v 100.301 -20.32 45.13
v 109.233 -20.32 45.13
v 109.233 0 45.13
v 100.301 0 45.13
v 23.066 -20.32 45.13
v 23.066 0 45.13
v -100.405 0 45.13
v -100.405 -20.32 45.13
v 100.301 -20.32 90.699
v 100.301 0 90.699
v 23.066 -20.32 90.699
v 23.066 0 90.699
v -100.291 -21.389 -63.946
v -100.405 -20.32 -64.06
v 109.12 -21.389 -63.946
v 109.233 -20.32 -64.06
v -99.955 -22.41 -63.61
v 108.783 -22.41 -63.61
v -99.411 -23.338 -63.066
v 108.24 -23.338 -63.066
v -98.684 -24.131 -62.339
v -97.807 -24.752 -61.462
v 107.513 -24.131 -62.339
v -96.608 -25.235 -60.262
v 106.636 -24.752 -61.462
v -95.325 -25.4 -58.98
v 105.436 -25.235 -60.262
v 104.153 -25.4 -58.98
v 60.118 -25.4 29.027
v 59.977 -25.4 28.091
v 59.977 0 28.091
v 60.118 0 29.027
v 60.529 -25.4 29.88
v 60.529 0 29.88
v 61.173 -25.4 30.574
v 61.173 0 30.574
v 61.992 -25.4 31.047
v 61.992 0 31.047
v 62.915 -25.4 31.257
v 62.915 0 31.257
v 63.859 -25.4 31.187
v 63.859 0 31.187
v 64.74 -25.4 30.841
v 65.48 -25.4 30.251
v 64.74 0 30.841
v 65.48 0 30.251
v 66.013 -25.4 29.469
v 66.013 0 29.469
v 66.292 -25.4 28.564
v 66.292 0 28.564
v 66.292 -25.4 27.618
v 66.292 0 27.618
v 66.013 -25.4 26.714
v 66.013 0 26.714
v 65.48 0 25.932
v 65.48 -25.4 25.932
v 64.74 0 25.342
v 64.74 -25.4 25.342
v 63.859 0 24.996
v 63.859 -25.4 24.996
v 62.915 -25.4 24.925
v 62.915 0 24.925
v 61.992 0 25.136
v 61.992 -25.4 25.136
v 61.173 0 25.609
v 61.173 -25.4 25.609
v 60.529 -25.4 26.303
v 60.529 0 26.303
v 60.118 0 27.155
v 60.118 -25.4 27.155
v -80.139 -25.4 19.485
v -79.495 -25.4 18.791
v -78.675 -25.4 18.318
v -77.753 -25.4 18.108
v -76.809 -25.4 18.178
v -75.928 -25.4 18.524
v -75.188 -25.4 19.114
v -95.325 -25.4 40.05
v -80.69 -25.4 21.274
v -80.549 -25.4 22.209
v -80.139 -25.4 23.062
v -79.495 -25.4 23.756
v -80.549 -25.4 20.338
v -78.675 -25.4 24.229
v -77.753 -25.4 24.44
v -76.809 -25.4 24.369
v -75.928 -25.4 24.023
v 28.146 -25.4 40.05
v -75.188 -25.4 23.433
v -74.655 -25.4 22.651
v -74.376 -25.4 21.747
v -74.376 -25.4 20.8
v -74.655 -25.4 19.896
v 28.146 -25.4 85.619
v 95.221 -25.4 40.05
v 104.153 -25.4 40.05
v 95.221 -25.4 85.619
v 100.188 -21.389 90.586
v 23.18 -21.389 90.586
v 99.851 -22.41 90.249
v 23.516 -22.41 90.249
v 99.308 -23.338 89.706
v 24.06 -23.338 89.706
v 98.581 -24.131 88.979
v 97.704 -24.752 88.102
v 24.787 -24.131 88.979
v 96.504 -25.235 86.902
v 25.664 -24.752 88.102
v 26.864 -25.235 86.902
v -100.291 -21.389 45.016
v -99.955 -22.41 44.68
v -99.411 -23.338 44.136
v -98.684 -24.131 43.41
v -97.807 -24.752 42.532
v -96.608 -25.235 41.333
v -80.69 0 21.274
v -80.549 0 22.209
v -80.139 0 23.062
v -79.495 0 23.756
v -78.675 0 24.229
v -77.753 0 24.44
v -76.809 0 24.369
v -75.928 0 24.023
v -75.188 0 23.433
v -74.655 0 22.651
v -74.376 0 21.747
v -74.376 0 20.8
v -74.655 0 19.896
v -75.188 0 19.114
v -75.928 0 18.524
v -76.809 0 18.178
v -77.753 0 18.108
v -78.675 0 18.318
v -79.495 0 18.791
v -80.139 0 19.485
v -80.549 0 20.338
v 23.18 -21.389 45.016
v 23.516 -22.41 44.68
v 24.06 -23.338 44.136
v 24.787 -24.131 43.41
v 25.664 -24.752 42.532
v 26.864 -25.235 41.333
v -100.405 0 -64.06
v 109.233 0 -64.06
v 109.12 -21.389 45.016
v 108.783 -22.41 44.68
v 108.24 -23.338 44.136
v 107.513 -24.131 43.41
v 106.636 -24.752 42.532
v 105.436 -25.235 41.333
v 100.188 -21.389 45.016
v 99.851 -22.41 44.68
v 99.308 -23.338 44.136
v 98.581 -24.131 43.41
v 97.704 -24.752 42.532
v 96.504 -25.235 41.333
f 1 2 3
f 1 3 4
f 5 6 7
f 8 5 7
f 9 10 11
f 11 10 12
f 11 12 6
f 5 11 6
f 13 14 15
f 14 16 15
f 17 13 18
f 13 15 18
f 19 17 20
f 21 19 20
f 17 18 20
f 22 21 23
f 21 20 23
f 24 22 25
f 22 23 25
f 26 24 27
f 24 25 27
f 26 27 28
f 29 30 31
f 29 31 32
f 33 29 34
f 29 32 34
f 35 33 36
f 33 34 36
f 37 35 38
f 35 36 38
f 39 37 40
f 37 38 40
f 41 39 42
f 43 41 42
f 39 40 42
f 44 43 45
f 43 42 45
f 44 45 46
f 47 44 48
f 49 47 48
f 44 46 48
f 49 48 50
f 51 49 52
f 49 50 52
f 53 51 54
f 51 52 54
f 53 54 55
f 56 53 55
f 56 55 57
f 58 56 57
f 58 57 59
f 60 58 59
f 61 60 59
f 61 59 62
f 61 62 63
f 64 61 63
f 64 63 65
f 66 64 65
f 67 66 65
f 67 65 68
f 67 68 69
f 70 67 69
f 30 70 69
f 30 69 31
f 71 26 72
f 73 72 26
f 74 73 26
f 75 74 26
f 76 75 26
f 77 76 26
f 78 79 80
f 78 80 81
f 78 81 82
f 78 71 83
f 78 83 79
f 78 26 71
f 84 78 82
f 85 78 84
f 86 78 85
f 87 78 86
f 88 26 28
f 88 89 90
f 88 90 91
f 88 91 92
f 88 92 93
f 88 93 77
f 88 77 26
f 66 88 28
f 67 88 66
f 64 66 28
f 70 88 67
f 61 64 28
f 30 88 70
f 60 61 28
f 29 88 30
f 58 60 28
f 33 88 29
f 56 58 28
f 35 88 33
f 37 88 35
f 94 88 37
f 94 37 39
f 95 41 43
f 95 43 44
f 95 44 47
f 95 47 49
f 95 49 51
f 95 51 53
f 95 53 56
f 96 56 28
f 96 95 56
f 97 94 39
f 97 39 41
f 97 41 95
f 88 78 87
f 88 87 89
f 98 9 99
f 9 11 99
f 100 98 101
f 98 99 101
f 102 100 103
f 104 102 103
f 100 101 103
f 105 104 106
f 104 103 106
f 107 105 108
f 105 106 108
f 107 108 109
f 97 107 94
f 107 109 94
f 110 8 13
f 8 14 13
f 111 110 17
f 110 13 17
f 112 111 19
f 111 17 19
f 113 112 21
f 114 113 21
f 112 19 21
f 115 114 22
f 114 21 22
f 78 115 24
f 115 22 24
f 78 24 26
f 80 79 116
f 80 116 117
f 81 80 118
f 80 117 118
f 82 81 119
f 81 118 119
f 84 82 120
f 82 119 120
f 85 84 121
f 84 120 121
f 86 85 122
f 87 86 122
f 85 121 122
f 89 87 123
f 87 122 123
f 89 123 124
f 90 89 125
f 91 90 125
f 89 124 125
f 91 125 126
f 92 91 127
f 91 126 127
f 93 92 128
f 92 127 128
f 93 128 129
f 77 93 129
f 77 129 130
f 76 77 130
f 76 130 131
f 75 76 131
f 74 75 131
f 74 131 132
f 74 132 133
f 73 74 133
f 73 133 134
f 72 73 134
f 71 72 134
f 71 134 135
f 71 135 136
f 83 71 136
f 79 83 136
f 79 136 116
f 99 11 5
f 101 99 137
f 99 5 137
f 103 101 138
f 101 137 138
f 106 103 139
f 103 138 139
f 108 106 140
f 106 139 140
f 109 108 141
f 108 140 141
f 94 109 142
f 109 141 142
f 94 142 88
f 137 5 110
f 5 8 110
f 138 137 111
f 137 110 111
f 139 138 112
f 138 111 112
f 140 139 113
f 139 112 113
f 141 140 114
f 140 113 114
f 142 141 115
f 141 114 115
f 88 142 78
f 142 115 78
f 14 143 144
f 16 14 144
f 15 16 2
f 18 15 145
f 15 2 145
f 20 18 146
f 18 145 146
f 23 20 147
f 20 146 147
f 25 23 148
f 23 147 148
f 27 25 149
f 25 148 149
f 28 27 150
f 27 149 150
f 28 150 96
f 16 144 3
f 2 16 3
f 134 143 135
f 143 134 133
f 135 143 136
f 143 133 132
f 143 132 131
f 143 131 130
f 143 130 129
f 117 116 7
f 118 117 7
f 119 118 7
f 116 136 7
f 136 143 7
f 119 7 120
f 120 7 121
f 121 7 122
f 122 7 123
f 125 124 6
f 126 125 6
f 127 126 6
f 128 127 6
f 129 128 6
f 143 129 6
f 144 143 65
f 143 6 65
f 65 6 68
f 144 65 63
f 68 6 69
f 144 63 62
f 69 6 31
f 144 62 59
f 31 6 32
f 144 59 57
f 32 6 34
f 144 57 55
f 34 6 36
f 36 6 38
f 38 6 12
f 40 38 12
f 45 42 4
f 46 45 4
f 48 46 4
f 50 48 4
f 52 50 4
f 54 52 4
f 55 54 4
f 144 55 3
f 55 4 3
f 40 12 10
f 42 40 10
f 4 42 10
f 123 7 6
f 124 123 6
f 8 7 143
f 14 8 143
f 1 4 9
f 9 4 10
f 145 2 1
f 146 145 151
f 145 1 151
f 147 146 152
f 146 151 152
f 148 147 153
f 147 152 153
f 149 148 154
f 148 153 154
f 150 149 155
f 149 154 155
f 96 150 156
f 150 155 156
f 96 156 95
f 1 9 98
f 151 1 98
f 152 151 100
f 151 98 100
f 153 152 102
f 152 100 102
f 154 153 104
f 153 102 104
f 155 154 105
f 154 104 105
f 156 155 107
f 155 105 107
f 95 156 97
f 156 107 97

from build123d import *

# Parameters (mm, degrees)
F0_W     = 19.7901576757
F0_H     = 22.3555974662
F1_DEPTH = 25.4
F0_W_2   = 77.2351417691
F0_H_2   = 37.3888155445
F0_W_3   = 14.1860321164
F0_H_3   = 13.0779221654
F2_R     = 5.08
F4_R     = 14.5126216771
F5_DEPTH = 4.064
F7_D     = 6.35


with BuildPart() as f1:
    # F0 (on Front) → F1 (new body)
    with BuildSketch(Plane.XZ):
        Polygon((-143.1801915169, 45.9882542491), (-120.1951056719, 45.9882542491), (-120.1951056719, 68.3438517153), (-120.1951056719, 90.6994491816), (-143.1801915169, 90.6994491816), align=None)
        with Locations((-110.300026834, 79.5216504484)):
            Rectangle(F0_W, F0_H)
    extrude(amount=F1_DEPTH)


with BuildPart() as f1b:
    # F0 (on Front) → F1, piece 2 (new body)
    with BuildSketch(Plane.XZ):
        Polygon((23.0662133545, 45.1301448047), (-100.4049479961, 45.1301448047), (-100.4049479961, -64.0596598387), (109.2333272099, -64.0596598387), (109.2333272099, 45.1301448047), (100.3013551235, 45.1301448047), (100.3013551235, 7.7413292602), (23.0662133545, 7.7413292602), align=None)
        Polygon((23.0662133545, 90.6994491816), (23.0662133545, 45.1301448047), (100.3013551235, 45.1301448047), (100.3013551235, 90.6994491816), (88.216945529, 90.6994491816), (88.216945529, 77.6215270162), (74.0309134126, 77.6215270162), (74.0309134126, 90.6994491816), align=None)
        with Locations((61.683784239, 26.4357370324)):
            Rectangle(F0_W_2, F0_H_2)
        with Locations((81.1239294708, 84.1604880989)):
            Rectangle(F0_W_3, F0_H_3)
    extrude(amount=F1_DEPTH)

    # F2
    f2_edges = [f1b.edges().sort_by_distance(p)[0] for p in [
        (-38.669367, -25.4, 45.130145),
        (-100.404948, -25.4, -9.464758),
        (4.41419, -25.4, -64.05966),
        (109.233327, -25.4, -9.464758),
        (104.767341, -25.4, 45.130145),
        (100.301355, -25.4, 67.914797),
        (61.683784, -25.4, 90.699449),
        (23.066213, -25.4, 67.914797),
    ]]
    fillet(f2_edges, radius=F2_R)

    # F4 (on Front) → F5 (join)
    with BuildSketch(Plane.XZ):
        with Locations((-73.5853686929, -5.0210841)):
            Circle(F4_R)
    extrude(amount=F5_DEPTH)

    # F7 (through all)
    with Locations(Plane.XZ.offset(25.4)):
        with Locations((-77.5153413415, 21.2736316025), (63.1522908807, 28.0912686139)):
            Hole(F7_D / 2)


solid = f1b.part
